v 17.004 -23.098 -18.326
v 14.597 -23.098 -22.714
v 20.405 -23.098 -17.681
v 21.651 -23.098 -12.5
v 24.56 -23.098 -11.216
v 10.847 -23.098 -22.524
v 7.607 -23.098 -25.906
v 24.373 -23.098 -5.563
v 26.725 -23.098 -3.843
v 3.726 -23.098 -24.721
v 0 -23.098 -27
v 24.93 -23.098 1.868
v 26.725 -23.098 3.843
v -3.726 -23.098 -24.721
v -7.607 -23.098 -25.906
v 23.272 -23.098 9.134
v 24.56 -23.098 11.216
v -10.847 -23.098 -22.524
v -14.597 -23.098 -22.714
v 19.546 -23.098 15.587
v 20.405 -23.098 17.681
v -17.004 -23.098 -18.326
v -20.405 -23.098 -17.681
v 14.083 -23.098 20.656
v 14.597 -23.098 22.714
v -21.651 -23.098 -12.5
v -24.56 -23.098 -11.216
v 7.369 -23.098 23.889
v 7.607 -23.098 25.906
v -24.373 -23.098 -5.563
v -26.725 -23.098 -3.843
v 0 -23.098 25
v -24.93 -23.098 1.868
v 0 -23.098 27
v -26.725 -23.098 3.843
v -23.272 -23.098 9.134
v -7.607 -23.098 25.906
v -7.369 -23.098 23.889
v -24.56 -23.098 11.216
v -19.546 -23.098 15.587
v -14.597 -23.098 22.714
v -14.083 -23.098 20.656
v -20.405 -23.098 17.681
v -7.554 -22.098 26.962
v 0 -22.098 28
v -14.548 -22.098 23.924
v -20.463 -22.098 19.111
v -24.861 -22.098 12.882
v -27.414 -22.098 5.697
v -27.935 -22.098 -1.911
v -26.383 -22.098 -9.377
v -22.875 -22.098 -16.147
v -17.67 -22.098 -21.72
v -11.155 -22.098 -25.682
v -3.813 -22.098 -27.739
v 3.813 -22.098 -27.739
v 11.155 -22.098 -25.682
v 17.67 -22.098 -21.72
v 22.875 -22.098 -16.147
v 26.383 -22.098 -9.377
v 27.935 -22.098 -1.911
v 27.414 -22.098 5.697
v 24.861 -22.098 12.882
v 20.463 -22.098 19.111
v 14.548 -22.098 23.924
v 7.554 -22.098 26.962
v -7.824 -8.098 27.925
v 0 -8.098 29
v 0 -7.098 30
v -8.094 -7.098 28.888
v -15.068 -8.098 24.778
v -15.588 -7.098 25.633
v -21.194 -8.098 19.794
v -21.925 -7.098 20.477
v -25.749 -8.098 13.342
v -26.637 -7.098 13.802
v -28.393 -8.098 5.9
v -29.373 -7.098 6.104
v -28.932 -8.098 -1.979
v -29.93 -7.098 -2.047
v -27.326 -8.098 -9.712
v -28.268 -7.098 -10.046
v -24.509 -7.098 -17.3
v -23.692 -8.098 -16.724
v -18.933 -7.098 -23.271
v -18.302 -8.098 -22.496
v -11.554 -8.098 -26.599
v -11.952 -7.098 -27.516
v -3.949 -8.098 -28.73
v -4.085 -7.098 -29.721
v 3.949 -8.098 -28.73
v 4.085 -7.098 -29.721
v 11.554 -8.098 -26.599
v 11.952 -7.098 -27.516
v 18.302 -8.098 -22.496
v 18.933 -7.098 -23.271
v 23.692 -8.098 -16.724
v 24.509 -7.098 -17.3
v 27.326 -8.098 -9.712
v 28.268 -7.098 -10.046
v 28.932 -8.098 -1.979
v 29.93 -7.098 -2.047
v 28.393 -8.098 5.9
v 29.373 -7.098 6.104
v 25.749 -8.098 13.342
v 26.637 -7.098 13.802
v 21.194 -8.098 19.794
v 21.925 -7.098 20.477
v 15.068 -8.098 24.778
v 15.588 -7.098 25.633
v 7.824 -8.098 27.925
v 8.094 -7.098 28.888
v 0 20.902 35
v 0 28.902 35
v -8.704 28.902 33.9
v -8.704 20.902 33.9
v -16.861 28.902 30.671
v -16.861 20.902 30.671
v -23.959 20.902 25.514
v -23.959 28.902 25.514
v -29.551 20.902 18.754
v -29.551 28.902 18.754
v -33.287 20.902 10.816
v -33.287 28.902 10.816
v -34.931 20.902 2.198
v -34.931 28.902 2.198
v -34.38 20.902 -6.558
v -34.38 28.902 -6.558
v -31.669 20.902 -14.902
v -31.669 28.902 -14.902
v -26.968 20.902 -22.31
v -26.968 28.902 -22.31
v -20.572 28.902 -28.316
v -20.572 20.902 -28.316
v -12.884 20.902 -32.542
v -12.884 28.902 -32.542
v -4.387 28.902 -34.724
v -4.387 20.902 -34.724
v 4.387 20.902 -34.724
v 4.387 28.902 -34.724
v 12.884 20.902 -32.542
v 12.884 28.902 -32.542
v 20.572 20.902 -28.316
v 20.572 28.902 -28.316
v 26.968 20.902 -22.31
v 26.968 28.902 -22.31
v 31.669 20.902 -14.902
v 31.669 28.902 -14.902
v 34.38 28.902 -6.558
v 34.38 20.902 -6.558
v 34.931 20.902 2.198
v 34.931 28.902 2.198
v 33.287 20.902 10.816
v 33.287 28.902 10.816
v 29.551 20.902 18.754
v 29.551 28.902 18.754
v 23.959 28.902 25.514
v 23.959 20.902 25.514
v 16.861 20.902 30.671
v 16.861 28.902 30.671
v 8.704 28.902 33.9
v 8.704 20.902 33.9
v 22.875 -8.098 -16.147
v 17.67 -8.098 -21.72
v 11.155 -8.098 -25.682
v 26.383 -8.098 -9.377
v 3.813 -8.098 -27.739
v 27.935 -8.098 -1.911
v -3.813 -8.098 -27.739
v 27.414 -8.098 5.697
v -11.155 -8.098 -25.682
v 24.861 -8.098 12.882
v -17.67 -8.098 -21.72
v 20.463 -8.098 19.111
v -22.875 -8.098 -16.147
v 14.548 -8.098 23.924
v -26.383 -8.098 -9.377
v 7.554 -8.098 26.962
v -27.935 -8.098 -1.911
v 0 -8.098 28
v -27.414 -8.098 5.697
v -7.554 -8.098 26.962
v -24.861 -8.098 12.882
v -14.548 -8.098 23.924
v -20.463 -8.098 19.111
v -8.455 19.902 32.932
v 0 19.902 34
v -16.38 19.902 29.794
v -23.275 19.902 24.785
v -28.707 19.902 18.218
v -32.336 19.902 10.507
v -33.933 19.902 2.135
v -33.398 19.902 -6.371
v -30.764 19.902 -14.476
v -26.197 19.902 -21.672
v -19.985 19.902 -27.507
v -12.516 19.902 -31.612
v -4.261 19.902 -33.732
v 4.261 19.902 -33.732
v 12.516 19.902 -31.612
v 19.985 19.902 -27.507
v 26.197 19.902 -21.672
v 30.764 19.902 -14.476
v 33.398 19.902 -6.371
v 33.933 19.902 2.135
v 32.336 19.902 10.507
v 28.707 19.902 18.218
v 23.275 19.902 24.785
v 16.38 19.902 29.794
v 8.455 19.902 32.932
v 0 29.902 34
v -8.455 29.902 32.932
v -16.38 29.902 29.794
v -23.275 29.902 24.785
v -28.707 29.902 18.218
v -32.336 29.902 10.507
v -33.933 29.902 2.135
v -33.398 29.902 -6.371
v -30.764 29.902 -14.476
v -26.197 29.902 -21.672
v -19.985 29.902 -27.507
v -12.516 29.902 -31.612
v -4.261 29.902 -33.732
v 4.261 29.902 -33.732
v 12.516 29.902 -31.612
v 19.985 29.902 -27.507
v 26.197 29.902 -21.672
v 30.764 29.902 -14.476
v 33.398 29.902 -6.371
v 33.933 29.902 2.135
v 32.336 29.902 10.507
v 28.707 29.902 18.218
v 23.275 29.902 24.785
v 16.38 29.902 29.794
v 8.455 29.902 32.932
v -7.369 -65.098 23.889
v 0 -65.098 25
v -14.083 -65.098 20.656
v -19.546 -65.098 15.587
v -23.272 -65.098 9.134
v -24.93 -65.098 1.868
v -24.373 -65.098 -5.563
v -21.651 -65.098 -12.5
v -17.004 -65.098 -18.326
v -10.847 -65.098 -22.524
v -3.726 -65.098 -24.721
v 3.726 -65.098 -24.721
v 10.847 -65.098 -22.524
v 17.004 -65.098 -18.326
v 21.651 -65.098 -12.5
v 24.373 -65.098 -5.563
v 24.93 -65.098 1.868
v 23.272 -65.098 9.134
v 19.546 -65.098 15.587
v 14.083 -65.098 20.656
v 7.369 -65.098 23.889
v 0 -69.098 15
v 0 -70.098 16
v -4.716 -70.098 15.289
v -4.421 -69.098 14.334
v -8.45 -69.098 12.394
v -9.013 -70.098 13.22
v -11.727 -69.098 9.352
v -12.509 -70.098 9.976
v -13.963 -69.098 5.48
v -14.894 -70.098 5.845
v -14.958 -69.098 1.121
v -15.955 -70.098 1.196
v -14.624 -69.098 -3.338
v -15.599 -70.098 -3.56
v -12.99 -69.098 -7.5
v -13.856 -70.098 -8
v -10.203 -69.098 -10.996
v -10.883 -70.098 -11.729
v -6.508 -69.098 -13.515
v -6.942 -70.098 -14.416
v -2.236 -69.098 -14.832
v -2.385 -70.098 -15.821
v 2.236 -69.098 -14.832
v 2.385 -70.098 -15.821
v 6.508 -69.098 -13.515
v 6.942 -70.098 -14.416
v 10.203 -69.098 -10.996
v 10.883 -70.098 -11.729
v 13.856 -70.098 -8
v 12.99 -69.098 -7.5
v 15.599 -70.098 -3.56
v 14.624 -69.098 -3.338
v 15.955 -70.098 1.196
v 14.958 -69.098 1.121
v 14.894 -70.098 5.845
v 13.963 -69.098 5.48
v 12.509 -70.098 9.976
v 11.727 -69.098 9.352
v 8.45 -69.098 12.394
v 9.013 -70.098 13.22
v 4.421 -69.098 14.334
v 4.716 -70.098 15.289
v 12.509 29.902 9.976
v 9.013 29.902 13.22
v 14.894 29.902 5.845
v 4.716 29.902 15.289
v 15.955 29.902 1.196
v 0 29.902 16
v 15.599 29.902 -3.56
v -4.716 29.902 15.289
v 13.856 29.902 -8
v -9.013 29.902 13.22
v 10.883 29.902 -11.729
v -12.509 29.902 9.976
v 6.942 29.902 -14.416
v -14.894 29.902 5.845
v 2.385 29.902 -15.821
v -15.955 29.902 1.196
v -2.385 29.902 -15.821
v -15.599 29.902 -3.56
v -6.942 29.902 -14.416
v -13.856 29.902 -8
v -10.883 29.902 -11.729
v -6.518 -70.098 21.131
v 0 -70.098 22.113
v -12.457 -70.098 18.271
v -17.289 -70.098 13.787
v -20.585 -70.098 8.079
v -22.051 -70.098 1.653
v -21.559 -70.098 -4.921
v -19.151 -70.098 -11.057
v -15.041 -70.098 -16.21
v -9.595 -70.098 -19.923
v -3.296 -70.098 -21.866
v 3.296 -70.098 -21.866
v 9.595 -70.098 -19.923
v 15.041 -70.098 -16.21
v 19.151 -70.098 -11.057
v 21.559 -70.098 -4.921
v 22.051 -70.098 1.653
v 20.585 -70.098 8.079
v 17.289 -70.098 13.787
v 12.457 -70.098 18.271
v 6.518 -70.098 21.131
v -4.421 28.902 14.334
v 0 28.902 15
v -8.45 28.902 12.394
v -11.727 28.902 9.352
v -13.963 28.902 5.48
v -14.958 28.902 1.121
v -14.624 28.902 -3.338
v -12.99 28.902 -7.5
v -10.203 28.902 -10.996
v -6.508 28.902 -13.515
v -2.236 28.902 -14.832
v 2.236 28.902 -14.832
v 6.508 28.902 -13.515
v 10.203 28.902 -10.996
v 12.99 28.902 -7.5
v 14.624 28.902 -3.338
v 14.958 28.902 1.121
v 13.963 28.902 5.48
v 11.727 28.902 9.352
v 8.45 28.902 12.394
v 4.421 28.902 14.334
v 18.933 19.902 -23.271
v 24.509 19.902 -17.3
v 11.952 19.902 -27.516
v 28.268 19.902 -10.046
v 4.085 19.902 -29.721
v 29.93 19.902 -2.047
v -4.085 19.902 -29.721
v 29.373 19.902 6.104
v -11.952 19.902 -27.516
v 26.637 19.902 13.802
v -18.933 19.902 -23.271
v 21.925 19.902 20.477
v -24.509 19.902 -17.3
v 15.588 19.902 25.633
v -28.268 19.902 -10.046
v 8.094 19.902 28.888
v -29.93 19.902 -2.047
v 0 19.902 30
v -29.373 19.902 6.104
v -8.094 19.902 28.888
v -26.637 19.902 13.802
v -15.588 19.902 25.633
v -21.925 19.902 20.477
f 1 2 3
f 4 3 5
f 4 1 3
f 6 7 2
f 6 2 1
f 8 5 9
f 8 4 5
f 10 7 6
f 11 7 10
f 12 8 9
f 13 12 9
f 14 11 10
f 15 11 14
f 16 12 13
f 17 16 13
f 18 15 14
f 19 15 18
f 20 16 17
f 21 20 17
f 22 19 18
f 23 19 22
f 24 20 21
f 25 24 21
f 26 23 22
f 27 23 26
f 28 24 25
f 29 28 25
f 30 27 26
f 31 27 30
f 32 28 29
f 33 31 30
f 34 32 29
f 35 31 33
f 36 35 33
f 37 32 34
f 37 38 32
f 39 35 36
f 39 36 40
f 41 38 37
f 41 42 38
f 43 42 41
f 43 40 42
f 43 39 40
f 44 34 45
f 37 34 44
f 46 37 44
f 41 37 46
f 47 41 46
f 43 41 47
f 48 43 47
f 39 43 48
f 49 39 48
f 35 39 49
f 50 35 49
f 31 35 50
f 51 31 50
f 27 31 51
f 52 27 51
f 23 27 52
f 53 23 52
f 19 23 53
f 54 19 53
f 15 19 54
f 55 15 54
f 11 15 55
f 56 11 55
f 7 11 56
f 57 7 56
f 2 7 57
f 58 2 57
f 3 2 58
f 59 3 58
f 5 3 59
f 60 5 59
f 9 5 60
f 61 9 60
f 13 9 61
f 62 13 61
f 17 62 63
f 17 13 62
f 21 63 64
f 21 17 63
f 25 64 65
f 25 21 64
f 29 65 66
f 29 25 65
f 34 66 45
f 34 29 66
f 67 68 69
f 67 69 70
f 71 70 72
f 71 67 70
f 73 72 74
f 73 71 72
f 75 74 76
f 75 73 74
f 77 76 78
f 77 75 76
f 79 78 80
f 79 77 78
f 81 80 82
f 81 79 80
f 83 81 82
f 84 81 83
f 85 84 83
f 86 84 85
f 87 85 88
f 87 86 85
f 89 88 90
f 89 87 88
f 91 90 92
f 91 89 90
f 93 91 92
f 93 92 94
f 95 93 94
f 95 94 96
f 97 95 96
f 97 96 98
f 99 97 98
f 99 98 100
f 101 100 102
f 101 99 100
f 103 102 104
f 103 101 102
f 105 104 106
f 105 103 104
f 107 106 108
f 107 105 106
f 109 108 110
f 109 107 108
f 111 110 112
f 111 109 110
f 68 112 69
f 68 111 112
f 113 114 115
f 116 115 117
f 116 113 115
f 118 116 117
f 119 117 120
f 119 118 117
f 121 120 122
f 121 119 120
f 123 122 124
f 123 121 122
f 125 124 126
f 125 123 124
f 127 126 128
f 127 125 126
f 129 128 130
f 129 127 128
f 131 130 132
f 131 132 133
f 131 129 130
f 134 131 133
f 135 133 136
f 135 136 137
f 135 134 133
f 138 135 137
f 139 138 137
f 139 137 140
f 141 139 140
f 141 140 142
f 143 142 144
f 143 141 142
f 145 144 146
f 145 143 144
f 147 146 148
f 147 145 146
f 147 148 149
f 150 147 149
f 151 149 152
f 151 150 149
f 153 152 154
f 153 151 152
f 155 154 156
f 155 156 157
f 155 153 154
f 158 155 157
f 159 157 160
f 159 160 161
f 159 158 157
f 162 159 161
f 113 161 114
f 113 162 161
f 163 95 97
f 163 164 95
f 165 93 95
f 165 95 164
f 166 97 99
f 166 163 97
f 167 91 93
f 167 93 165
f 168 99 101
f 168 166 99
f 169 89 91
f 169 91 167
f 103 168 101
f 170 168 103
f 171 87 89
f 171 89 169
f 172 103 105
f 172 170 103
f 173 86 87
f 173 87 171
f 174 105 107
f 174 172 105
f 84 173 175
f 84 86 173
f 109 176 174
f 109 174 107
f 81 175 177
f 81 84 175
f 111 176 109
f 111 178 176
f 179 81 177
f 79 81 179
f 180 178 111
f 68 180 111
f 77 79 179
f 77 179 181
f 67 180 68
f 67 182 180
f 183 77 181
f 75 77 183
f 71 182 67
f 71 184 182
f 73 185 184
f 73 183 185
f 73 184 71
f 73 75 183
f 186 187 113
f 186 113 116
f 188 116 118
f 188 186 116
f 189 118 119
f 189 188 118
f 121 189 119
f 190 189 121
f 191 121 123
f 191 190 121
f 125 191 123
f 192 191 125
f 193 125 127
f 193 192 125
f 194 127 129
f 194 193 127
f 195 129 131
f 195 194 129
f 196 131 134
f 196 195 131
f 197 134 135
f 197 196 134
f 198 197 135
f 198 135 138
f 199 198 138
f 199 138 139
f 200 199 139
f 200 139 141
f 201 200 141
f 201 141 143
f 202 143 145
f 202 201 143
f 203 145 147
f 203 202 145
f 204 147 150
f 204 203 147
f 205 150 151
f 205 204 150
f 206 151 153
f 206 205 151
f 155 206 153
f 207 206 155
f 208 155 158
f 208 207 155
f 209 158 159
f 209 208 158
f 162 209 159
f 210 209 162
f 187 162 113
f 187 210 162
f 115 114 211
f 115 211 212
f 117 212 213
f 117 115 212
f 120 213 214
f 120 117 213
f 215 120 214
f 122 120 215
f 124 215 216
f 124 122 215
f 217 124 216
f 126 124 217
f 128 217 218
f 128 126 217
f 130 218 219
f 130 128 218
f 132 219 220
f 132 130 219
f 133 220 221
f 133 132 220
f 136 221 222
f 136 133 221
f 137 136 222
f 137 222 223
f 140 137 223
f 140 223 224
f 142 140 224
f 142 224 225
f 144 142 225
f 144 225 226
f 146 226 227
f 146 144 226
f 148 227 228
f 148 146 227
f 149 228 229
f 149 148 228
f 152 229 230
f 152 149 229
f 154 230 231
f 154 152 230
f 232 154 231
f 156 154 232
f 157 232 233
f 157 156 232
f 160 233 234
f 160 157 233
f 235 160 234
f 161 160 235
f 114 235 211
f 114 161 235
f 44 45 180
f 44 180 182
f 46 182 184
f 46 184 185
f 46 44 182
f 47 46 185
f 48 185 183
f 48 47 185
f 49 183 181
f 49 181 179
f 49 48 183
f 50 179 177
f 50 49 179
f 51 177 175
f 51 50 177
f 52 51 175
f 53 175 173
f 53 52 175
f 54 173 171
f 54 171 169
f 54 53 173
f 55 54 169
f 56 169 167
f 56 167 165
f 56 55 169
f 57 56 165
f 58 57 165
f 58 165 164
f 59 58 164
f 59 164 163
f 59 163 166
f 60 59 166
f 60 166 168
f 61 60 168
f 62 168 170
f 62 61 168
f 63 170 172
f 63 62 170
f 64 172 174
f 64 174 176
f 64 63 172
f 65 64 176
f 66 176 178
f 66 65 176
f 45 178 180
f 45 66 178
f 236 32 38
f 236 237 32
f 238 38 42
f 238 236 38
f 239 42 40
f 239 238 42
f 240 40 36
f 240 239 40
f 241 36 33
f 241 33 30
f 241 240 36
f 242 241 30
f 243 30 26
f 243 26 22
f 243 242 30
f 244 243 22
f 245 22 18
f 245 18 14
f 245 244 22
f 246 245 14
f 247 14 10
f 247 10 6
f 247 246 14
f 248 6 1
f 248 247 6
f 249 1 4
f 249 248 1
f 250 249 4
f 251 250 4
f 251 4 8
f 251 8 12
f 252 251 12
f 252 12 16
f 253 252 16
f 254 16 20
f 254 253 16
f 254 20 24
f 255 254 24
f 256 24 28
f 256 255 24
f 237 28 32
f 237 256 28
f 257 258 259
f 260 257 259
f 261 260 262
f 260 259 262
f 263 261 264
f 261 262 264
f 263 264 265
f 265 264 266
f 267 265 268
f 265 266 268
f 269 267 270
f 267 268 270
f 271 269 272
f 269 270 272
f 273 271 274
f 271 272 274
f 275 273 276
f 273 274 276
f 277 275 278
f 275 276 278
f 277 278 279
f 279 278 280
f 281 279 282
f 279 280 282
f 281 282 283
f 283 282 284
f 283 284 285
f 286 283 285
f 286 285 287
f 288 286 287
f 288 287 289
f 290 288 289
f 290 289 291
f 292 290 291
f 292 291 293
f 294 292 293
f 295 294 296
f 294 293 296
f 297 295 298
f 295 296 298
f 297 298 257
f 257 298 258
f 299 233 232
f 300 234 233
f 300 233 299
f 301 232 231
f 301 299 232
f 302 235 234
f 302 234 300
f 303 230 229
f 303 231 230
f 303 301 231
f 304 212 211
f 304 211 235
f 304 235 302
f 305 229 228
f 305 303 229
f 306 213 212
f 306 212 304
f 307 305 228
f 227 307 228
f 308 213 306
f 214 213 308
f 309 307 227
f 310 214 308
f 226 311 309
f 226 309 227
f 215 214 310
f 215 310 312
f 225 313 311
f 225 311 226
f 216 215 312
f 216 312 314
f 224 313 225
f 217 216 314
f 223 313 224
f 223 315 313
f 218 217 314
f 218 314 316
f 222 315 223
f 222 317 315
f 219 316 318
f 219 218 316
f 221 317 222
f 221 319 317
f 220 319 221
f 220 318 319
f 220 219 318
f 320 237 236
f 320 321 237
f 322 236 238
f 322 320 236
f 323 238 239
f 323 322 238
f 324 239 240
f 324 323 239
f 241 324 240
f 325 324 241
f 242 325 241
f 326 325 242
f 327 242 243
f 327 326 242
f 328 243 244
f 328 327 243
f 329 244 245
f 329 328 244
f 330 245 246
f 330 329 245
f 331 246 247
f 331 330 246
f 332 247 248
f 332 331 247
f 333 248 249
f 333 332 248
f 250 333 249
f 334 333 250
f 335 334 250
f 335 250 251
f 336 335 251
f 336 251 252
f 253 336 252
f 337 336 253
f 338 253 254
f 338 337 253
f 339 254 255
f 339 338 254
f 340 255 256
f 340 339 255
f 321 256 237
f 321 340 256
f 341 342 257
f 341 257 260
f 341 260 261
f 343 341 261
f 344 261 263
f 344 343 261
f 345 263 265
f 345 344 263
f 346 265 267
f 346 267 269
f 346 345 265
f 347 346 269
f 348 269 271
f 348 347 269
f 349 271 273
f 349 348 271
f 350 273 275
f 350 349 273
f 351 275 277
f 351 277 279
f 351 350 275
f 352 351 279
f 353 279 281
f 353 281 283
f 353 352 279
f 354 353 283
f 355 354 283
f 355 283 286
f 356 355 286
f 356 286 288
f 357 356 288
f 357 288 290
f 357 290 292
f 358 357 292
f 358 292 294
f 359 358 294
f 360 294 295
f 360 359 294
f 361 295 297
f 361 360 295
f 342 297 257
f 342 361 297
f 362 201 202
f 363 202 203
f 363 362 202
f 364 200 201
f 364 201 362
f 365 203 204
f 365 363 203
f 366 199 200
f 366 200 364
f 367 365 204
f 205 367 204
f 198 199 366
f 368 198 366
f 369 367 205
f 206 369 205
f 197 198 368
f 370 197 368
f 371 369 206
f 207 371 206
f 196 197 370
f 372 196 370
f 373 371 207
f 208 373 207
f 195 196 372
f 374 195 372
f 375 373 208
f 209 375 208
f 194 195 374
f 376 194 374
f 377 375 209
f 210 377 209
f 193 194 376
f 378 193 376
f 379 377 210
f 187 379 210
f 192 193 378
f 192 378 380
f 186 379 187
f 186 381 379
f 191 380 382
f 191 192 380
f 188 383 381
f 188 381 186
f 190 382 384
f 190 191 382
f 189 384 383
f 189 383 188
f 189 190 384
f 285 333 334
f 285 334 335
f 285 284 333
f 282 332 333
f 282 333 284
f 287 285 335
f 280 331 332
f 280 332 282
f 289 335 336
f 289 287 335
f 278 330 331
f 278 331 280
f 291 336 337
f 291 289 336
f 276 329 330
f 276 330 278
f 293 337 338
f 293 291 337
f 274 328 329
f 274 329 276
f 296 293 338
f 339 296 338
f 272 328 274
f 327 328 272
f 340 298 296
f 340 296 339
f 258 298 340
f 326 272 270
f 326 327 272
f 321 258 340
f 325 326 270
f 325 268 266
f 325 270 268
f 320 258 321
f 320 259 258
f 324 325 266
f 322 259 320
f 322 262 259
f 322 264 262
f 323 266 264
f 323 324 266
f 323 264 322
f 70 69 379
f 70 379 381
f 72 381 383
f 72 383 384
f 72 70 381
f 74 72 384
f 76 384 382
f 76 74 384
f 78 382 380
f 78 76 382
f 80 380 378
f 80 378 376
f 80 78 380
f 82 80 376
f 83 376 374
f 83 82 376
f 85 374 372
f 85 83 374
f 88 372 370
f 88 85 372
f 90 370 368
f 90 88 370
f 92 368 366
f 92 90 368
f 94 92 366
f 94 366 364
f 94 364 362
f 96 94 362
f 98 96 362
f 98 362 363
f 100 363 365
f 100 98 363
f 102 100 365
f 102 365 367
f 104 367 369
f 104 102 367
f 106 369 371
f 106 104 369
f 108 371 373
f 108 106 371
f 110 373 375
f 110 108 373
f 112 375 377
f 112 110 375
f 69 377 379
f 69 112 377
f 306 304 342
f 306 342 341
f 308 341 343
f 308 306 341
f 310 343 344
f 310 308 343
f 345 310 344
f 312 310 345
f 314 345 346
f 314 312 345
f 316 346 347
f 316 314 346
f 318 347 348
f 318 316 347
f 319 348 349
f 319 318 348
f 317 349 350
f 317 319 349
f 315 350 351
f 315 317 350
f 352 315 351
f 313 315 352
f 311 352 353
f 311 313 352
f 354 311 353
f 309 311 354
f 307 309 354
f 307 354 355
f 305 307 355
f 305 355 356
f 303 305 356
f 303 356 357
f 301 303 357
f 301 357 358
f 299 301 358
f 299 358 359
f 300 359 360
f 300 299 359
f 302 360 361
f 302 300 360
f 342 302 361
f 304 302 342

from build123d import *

# Parameters (mm, degrees)
SFAZOWANIE1_SIZE = 1


with BuildPart() as part:
    # Szkic1 → Obrót1 (revolve)
    with BuildSketch(Plane.XY, mode=Mode.PRIVATE) as obr_t1_sk:
        Polygon((-15, -70.098020295), (-15, 29.901979705), (-35, 29.901979705), (-35, 19.901979705), (-30, 19.901979705), (-30, -8.098020295), (-28, -8.098020295), (-28, -23.098020295), (-25, -23.098020295), (-25, -65.098020295), (-22.113248654, -70.098020295), align=None)
    revolve(obr_t1_sk.sketch.rotate(Axis((0, 34.945352564, 0), (0, -1, 0)), 270), axis=Axis((0, 34.945352564, 0), (0, -1, 0)))

    # Sfazowanie1
    sfazowanie1_edges = [part.edges().sort_by_distance(p)[0] for p in [
        (0, 19.901979705, -35),
        (0, 29.901979705, -35),
        (0, 29.901979705, -15),
        (0, -70.098020295, -15),
        (0, -23.098020295, -28),
        (0, -8.098020295, -30),
    ]]
    chamfer(sfazowanie1_edges, length=SFAZOWANIE1_SIZE)


solid = part.part
